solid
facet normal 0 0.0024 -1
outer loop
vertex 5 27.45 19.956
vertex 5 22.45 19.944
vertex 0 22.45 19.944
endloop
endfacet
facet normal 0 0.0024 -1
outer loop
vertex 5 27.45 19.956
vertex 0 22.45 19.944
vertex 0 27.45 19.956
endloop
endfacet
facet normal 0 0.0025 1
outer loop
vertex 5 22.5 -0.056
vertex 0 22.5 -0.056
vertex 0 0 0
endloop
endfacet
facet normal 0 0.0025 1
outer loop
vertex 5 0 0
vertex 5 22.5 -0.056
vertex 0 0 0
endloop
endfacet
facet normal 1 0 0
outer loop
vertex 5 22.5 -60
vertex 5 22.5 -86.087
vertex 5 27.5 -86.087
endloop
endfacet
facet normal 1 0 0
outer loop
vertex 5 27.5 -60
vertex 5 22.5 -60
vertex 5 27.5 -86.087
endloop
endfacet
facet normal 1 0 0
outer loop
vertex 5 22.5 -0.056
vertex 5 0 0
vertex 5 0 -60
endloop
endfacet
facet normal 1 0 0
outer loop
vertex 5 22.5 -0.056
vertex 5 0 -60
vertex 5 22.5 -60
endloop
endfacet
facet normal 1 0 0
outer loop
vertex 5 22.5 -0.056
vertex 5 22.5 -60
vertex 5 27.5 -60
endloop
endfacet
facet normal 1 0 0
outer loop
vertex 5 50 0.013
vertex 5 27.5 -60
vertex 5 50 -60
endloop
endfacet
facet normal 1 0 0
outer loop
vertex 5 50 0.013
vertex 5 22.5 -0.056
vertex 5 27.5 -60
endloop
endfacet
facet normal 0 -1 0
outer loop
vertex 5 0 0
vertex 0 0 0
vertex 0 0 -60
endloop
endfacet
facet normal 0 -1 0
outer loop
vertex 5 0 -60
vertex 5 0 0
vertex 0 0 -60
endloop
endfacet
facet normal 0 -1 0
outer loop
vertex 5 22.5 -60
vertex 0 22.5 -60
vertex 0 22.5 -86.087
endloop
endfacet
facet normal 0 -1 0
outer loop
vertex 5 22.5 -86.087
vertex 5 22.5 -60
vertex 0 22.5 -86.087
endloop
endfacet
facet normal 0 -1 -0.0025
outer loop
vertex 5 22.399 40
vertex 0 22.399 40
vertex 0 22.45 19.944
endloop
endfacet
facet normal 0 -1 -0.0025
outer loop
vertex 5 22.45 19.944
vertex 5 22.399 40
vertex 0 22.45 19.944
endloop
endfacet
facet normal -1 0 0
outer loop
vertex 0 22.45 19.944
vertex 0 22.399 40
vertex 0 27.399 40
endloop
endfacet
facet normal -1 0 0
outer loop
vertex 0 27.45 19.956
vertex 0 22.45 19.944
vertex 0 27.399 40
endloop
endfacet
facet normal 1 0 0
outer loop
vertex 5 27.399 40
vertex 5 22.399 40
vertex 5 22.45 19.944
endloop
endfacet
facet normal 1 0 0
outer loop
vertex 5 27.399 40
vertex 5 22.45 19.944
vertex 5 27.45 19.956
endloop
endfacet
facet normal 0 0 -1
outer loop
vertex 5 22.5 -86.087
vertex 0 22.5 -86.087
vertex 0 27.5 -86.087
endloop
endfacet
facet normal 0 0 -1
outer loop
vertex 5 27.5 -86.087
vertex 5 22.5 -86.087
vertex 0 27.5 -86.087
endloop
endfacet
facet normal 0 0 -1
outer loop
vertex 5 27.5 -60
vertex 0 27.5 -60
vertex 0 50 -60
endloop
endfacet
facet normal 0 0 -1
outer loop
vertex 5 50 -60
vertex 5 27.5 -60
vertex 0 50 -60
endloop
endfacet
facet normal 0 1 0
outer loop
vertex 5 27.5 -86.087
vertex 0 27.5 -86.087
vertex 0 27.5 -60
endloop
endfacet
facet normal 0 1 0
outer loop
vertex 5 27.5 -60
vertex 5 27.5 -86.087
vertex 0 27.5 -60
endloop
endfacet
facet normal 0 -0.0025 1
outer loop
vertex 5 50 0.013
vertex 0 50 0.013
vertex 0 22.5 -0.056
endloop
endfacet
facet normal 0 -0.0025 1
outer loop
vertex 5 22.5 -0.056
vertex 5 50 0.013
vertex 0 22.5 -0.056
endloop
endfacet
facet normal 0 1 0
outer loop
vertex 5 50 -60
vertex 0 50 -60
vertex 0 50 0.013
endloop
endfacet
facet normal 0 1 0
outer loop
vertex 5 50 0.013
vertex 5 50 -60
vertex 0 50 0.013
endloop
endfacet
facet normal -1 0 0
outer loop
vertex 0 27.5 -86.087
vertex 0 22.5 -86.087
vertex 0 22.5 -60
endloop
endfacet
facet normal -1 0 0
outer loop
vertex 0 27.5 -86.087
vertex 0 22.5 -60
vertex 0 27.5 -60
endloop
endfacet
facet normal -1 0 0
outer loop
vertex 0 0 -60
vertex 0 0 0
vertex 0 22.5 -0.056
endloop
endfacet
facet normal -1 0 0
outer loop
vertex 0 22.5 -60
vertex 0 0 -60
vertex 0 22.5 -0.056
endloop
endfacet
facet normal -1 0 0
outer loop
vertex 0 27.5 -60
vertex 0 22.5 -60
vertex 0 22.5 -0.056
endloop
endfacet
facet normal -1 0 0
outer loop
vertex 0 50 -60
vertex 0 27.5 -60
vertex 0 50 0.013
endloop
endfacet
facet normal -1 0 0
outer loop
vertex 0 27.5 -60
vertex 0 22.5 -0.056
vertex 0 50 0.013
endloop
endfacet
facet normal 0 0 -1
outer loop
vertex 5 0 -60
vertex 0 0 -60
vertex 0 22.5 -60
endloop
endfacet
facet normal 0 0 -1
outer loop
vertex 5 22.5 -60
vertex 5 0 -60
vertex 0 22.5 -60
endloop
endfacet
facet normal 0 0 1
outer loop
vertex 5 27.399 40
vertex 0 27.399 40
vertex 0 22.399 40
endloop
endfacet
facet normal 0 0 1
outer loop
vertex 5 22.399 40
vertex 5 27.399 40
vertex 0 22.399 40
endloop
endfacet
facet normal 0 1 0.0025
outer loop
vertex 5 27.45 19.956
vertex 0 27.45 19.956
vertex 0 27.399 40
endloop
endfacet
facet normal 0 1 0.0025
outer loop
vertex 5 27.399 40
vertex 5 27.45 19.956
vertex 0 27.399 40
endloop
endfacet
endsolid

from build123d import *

# Parameters (mm, degrees)
F1_DEPTH = 5


with BuildPart() as f1:
    # F0 (on Right) → F1 (new body)
    with BuildSketch(Plane.YZ):
        Polygon((22.5, -0.056019), (0, 0), (0, -60), (12, -60), (12.401176, -60), (22.5, -60), (22.5, -86.0869), (27.5, -86.0869), (27.5, -81.065385), (27.5, -60), (50, -60), (50, 0.013014), align=None)
        Polygon((22.399447, 40), (22.449794, 19.943918), (27.449763, 19.956469), (27.399447, 40), align=None)
    extrude(amount=F1_DEPTH)


solid = f1.part
